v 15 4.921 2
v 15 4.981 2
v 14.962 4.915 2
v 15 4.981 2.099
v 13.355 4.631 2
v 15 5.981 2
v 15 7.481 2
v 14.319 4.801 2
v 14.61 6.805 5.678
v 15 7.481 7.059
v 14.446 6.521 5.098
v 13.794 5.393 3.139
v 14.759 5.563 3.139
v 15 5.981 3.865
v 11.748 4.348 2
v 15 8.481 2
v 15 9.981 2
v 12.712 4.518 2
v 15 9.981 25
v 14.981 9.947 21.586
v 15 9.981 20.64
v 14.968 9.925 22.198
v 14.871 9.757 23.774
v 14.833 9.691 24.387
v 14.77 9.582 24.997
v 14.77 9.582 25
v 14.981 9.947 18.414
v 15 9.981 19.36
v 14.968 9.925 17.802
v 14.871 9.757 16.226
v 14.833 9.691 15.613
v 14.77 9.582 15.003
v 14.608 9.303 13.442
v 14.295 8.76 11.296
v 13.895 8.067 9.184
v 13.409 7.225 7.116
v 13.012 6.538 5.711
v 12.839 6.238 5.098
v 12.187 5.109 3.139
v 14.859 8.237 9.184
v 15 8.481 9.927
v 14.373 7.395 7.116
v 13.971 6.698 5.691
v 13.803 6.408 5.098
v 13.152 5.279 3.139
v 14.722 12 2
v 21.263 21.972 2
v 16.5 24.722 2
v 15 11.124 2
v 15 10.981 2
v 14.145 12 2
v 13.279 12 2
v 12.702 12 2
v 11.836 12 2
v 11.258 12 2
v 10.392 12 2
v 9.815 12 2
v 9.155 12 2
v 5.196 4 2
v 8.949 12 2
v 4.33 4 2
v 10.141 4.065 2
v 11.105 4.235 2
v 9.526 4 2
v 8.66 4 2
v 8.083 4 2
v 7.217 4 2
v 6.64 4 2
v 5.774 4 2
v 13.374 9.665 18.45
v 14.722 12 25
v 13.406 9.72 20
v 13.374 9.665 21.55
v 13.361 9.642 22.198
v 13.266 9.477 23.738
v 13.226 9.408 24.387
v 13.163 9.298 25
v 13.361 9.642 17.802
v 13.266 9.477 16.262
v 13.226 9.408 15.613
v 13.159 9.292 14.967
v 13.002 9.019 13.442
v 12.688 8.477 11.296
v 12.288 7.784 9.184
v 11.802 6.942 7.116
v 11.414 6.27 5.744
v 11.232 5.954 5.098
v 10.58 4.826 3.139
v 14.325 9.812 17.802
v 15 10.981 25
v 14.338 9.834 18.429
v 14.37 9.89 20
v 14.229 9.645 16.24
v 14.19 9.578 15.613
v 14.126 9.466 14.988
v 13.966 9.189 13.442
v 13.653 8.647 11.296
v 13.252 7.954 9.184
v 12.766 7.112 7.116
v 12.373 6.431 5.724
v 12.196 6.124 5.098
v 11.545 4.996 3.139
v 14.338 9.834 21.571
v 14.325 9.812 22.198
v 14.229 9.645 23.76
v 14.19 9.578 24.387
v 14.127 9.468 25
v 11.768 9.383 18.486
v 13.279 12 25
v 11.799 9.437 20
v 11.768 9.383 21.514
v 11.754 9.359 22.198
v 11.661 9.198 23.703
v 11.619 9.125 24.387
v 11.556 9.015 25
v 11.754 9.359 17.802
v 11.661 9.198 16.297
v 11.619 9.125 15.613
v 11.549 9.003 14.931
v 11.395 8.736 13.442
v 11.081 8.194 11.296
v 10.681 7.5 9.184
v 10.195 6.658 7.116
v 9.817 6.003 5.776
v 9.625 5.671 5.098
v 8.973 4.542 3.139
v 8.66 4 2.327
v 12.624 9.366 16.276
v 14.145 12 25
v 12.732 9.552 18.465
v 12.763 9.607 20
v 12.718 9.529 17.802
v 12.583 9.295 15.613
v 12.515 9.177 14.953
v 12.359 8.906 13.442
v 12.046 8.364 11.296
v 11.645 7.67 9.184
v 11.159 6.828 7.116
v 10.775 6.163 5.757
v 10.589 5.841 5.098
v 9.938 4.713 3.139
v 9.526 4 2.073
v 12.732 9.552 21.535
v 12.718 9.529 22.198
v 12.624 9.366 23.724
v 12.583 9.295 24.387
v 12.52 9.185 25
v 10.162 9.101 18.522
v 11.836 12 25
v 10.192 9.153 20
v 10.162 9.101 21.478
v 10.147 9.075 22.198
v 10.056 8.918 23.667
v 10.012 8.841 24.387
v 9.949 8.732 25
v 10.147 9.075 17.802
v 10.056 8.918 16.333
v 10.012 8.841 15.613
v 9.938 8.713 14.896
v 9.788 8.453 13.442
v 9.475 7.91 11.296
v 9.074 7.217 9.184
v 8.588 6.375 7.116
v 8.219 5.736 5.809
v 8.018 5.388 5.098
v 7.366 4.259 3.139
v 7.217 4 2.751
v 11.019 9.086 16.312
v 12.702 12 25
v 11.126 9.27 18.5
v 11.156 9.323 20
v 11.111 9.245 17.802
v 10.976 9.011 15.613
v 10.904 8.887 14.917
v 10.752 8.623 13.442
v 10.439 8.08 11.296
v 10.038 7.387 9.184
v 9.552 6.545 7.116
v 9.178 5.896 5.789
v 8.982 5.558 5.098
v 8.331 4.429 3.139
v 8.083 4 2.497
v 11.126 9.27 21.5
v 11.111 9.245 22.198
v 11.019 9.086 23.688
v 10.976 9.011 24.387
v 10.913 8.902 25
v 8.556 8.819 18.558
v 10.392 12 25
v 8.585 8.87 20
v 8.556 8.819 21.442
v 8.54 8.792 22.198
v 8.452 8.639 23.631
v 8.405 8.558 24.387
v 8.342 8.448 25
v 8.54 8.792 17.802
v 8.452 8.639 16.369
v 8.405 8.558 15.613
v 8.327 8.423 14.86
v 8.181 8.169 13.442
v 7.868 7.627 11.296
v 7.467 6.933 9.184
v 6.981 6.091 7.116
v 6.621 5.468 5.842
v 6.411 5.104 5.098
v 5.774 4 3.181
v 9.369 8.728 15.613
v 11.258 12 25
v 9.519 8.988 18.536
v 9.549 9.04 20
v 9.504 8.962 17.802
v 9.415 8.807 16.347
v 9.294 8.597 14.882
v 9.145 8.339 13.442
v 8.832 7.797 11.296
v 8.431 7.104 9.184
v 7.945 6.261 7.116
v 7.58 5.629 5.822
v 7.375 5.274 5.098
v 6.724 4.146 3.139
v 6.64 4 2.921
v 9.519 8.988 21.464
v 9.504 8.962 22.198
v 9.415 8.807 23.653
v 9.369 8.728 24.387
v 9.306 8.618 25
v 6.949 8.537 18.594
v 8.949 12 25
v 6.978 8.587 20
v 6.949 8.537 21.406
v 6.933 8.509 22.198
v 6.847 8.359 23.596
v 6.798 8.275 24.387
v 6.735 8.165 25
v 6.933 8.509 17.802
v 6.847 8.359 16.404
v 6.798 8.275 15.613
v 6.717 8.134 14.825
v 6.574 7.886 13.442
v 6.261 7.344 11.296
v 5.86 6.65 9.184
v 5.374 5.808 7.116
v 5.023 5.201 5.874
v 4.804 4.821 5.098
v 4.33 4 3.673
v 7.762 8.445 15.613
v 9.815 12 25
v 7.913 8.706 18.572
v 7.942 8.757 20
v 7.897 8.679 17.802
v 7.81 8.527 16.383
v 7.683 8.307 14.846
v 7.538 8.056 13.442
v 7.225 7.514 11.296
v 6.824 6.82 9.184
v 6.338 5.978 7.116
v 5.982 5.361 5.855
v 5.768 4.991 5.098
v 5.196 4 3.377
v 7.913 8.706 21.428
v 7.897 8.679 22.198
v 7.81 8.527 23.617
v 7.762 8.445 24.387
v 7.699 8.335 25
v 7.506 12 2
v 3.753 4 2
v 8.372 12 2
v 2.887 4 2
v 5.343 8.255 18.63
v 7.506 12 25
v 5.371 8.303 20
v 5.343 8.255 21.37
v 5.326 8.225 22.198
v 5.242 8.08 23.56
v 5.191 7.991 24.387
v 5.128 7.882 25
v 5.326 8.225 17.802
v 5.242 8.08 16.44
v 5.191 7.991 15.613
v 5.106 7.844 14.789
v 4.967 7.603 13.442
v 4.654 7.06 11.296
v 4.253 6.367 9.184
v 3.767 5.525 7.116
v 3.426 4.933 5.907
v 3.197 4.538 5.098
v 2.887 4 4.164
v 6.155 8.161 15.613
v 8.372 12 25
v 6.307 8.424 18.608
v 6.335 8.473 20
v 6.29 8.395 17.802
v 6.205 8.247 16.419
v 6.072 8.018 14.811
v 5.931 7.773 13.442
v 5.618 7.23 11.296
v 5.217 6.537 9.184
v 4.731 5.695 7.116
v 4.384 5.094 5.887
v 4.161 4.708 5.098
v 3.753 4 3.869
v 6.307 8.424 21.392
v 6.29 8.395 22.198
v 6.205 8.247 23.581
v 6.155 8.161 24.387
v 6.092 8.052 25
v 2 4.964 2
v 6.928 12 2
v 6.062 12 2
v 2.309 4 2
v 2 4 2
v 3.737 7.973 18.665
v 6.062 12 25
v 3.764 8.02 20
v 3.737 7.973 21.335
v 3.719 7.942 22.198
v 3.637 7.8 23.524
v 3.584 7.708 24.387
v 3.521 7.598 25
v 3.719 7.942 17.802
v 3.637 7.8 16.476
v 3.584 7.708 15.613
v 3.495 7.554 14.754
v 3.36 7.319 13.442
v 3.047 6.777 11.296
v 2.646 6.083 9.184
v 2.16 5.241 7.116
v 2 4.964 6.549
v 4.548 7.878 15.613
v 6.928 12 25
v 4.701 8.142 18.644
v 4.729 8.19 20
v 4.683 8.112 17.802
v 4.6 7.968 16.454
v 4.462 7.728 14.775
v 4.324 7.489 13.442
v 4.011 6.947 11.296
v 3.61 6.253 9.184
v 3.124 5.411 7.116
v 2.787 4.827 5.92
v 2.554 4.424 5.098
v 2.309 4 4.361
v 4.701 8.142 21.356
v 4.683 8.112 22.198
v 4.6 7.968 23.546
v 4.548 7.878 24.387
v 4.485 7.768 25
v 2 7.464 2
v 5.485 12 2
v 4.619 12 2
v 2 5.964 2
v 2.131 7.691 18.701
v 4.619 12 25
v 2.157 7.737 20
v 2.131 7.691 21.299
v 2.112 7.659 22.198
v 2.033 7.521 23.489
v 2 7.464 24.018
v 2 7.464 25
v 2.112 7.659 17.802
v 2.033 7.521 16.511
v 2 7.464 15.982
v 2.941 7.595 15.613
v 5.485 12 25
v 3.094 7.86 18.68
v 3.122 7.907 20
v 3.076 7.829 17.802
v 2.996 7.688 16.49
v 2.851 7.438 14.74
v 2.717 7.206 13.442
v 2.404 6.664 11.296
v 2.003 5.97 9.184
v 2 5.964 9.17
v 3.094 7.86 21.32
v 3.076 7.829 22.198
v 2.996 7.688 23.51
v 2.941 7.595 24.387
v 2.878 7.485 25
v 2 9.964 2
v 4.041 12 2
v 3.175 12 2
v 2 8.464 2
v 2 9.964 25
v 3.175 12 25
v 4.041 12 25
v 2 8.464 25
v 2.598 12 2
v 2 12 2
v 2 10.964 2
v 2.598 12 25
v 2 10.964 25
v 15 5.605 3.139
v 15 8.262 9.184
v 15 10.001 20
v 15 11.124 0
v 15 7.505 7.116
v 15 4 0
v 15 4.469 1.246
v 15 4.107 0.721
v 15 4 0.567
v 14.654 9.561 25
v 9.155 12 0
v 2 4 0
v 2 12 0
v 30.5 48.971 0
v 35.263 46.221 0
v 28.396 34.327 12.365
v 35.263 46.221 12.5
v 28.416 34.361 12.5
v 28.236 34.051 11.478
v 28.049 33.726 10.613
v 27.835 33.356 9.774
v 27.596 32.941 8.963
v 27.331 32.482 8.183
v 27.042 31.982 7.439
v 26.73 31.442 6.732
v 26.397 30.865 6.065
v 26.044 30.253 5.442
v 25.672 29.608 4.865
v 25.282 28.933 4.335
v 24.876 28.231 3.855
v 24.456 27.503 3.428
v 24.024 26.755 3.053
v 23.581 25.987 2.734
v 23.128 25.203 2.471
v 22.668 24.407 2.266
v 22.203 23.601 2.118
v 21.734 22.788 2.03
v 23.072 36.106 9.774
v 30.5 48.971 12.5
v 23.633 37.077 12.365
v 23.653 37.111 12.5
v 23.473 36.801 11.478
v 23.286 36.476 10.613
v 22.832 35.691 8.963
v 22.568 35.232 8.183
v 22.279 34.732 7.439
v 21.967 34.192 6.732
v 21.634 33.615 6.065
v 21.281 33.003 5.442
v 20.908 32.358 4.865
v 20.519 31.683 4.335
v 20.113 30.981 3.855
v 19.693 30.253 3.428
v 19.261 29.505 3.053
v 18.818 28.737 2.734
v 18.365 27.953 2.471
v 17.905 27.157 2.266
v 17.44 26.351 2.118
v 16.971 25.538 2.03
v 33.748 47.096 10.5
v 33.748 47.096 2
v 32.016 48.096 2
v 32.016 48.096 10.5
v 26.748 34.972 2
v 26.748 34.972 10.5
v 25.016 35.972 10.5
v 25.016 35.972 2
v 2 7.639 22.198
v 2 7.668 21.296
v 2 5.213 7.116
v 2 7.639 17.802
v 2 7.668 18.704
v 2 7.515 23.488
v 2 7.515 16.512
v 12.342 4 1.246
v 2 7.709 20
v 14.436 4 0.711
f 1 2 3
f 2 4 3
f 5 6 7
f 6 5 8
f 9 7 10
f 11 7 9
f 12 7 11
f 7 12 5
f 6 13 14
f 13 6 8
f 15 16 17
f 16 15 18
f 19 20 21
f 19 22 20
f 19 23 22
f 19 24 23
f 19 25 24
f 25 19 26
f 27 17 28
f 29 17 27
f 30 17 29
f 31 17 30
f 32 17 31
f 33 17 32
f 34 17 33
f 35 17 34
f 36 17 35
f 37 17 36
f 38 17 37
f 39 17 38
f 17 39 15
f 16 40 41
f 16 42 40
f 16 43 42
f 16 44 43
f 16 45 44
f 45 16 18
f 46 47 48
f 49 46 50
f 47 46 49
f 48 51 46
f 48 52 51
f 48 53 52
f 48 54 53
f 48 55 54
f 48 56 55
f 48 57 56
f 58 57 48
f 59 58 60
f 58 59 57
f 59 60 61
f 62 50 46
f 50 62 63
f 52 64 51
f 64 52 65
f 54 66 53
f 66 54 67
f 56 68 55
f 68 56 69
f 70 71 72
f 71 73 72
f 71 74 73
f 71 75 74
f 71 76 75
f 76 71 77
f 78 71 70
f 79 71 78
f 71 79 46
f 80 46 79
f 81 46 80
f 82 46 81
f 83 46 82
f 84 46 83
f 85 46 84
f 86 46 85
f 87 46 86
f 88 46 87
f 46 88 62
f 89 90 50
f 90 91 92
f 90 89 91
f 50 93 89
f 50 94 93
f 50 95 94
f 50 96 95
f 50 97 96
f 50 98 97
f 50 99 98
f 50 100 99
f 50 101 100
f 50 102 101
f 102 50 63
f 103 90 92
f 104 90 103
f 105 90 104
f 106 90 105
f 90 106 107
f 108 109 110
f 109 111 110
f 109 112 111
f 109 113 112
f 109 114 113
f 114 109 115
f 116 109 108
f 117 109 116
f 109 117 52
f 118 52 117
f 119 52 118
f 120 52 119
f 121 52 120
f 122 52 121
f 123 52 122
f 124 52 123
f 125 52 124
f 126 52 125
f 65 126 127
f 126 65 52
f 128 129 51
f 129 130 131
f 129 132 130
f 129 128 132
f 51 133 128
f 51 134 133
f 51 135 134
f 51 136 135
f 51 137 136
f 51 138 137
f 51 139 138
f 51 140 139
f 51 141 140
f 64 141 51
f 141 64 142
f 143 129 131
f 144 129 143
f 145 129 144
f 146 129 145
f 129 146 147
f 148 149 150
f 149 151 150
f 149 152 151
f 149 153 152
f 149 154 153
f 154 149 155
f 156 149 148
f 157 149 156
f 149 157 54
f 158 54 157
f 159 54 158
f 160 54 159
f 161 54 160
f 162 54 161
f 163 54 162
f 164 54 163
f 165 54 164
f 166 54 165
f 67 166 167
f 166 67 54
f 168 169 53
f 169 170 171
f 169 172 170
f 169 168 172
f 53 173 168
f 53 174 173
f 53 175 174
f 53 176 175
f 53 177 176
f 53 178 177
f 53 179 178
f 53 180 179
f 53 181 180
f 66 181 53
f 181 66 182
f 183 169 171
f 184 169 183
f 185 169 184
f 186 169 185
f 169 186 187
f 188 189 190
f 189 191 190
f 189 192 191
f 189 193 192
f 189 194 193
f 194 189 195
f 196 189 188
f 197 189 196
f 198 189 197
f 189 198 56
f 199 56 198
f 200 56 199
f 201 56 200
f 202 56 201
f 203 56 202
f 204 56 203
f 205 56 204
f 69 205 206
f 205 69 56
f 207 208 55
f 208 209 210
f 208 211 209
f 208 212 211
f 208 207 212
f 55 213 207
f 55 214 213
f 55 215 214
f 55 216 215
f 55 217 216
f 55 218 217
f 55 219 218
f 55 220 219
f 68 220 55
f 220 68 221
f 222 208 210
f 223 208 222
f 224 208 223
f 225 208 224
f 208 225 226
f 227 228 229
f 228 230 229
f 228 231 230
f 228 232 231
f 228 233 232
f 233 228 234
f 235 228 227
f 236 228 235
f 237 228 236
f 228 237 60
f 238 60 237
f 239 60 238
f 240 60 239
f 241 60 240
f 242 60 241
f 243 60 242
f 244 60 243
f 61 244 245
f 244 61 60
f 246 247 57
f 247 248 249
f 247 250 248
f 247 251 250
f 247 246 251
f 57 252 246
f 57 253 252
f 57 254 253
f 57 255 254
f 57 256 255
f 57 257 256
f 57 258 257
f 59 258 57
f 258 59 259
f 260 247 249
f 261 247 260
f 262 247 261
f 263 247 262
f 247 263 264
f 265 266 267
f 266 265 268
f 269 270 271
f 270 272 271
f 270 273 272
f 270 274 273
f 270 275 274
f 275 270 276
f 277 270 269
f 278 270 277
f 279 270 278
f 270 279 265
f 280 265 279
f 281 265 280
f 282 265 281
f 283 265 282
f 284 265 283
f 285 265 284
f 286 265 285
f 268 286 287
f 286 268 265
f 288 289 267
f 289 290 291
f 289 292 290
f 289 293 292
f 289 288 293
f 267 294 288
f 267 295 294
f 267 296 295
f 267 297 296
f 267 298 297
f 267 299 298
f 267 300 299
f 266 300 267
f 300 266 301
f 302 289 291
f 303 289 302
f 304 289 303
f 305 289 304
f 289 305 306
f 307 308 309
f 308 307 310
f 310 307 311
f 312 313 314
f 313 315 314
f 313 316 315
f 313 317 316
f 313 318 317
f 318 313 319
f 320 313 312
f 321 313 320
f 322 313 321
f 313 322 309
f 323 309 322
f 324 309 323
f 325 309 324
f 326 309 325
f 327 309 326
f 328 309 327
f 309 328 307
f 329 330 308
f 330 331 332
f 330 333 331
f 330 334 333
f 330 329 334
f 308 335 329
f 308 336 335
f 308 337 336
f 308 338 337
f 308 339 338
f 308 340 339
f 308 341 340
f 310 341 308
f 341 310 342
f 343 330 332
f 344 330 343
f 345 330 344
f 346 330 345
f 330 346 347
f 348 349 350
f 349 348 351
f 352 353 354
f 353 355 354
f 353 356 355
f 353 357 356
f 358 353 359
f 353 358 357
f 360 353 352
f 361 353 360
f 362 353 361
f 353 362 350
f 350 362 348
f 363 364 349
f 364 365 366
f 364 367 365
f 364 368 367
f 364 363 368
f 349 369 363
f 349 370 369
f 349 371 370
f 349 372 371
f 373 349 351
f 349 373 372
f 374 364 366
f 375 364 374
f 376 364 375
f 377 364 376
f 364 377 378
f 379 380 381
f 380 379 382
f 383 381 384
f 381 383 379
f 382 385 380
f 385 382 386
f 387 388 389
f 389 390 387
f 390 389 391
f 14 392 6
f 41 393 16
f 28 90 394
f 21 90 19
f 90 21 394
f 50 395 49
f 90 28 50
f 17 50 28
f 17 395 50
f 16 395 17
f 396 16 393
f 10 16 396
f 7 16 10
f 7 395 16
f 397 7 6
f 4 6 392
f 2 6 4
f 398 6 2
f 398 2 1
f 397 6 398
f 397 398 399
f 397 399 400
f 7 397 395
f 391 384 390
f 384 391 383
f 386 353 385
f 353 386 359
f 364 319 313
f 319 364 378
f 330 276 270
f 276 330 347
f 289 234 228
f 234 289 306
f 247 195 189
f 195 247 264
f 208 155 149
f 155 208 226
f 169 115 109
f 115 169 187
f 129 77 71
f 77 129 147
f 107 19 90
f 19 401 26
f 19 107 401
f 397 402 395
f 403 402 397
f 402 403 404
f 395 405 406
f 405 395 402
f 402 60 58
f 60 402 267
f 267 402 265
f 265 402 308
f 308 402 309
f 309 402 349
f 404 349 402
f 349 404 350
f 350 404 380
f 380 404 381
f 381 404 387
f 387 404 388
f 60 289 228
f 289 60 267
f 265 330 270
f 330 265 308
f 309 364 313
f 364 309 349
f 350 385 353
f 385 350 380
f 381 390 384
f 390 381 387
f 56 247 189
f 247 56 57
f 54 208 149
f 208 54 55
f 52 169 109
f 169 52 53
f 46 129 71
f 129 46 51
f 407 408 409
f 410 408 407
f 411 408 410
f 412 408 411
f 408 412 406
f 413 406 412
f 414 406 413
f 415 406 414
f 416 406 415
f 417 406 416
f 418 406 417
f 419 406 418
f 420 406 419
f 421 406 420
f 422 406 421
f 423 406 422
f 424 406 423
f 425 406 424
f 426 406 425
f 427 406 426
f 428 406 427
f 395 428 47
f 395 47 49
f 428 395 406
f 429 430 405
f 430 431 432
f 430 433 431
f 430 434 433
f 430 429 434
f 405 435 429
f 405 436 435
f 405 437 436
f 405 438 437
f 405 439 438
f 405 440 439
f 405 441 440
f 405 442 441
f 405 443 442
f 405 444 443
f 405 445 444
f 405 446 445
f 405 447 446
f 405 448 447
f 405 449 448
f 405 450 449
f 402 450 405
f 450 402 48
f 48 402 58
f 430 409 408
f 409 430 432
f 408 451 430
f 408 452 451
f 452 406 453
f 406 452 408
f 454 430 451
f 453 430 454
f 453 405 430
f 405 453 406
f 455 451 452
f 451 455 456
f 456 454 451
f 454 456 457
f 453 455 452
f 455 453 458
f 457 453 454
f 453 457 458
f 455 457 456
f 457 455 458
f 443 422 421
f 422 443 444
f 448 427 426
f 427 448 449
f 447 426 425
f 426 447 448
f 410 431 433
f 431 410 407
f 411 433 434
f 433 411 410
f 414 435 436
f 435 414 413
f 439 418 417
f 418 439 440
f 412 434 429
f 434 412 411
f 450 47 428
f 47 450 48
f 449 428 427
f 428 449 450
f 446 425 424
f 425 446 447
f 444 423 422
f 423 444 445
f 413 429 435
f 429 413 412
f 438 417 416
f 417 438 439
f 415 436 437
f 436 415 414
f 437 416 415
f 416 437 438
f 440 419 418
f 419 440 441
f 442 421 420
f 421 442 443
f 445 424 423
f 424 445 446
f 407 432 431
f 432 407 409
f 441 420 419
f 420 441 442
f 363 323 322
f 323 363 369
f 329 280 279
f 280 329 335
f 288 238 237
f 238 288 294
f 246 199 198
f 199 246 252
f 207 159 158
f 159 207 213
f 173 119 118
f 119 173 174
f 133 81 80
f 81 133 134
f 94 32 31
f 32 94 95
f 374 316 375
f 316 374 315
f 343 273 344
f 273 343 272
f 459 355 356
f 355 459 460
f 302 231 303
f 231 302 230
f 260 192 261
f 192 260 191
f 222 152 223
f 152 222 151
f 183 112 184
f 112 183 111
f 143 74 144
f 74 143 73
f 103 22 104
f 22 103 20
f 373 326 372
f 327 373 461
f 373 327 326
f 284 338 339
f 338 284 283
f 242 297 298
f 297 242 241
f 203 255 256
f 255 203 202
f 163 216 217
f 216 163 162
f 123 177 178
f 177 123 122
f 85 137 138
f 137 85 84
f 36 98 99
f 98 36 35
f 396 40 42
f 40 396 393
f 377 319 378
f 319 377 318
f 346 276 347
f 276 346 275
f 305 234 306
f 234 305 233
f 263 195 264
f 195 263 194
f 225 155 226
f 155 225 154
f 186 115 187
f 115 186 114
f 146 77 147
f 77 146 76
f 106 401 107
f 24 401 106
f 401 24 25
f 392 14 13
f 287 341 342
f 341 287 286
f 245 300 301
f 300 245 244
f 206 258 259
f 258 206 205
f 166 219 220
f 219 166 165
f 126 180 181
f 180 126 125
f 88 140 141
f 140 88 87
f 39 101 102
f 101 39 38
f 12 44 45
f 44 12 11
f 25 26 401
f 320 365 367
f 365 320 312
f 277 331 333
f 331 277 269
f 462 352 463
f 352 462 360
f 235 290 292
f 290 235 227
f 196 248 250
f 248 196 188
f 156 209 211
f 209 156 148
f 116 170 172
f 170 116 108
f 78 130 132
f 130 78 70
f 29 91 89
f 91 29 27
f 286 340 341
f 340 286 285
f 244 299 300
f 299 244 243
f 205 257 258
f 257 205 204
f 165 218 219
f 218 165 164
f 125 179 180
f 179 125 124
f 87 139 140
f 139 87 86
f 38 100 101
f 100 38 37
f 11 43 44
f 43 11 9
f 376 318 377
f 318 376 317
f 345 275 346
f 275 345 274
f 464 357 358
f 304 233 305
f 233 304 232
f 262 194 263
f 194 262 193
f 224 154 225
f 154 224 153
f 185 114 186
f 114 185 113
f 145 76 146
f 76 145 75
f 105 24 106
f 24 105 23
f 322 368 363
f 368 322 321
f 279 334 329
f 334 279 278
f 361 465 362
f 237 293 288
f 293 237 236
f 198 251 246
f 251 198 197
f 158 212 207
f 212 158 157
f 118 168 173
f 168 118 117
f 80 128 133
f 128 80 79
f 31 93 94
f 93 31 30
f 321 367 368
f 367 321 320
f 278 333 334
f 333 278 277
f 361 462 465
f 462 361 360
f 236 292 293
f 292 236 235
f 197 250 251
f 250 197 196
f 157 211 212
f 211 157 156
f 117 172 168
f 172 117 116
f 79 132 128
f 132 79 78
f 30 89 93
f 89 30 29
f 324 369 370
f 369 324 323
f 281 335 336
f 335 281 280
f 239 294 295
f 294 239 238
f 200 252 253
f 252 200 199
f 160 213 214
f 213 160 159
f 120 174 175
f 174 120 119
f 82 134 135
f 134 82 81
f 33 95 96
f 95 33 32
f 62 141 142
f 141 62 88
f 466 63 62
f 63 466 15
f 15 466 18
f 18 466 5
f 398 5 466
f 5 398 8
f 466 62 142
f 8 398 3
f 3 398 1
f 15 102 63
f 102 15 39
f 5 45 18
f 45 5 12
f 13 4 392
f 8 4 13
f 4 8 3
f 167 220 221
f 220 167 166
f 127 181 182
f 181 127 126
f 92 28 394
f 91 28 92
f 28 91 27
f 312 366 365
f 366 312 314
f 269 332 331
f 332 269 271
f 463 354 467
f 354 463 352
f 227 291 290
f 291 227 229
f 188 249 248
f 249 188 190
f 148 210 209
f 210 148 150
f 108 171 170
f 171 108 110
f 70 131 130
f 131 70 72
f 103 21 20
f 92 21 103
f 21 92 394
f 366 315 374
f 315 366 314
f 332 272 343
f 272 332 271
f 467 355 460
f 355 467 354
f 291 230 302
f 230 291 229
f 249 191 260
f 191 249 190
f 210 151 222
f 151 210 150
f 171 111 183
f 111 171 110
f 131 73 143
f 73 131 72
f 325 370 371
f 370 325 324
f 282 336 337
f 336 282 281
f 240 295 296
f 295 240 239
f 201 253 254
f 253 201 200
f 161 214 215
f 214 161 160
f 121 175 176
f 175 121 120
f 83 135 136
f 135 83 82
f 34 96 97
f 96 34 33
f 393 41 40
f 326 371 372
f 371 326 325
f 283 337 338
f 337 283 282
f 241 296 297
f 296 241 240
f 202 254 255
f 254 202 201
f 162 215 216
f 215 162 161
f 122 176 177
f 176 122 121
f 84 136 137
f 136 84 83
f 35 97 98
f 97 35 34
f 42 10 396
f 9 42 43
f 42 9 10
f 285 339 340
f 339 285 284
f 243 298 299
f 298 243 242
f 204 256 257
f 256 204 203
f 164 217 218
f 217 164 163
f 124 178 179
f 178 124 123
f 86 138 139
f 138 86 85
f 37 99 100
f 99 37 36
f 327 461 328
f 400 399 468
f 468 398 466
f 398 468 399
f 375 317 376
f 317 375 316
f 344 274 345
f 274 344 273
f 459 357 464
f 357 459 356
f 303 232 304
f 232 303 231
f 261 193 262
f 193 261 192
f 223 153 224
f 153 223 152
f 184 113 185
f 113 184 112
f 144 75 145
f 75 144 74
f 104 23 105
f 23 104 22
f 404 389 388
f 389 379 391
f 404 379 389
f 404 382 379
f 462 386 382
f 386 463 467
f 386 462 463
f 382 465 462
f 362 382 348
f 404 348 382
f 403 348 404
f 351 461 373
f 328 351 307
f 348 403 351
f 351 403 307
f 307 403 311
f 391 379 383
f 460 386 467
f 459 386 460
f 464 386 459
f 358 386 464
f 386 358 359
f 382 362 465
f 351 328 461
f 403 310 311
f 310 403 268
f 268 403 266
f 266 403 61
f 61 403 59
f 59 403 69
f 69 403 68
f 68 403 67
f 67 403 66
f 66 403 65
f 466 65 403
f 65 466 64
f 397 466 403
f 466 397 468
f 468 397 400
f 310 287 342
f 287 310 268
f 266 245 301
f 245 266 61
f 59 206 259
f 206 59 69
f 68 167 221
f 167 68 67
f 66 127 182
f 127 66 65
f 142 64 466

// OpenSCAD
$fn = 100;
difference(){
    union(){
        difference(){
            cube([15,12,25]);
            rotate([0,0,60]){
                for (i = [-25:1.25:20]){               
                    translate([0,i,2]){
                        cube([40,0.75,30]);
                    }
                }
            }
        }

        translate([8,10,0]){
            rotate([0,0,-30]){
                difference(){
                    union(){
                        cube([5.5,23,6]);
                        translate([0,20,0]){
                            cube([5.5,25,12.5]);
                        }
                    }
                    translate([1.75,31,2]){
                        cube([2,25,8.5]);
                    }
                    
                    hull(){
                    translate([-13,0,17]){
                    rotate([0,90,0]){
                        cylinder(h=30,d=30);
                        }
                        }
                    translate([-13,17,17]){
                    rotate([0,90,0]){
                        cylinder(h=30,d=30);
                        }
                        }
                        }
                    
                }
            }
        }
        
    }

    translate([-50,-37,20]){
        rotate([0,90,10]){
           # cylinder(d=70,h=100);
        }
    }
    
    translate([-28,-7,-1]){
    rotate([0,0,0]){
        cube([30,30,30]);
    }
    }
    
    translate([0,-26,-1]){
    rotate([0,0,0]){
        cube([30,30,30]);
    }
    }
    
}
